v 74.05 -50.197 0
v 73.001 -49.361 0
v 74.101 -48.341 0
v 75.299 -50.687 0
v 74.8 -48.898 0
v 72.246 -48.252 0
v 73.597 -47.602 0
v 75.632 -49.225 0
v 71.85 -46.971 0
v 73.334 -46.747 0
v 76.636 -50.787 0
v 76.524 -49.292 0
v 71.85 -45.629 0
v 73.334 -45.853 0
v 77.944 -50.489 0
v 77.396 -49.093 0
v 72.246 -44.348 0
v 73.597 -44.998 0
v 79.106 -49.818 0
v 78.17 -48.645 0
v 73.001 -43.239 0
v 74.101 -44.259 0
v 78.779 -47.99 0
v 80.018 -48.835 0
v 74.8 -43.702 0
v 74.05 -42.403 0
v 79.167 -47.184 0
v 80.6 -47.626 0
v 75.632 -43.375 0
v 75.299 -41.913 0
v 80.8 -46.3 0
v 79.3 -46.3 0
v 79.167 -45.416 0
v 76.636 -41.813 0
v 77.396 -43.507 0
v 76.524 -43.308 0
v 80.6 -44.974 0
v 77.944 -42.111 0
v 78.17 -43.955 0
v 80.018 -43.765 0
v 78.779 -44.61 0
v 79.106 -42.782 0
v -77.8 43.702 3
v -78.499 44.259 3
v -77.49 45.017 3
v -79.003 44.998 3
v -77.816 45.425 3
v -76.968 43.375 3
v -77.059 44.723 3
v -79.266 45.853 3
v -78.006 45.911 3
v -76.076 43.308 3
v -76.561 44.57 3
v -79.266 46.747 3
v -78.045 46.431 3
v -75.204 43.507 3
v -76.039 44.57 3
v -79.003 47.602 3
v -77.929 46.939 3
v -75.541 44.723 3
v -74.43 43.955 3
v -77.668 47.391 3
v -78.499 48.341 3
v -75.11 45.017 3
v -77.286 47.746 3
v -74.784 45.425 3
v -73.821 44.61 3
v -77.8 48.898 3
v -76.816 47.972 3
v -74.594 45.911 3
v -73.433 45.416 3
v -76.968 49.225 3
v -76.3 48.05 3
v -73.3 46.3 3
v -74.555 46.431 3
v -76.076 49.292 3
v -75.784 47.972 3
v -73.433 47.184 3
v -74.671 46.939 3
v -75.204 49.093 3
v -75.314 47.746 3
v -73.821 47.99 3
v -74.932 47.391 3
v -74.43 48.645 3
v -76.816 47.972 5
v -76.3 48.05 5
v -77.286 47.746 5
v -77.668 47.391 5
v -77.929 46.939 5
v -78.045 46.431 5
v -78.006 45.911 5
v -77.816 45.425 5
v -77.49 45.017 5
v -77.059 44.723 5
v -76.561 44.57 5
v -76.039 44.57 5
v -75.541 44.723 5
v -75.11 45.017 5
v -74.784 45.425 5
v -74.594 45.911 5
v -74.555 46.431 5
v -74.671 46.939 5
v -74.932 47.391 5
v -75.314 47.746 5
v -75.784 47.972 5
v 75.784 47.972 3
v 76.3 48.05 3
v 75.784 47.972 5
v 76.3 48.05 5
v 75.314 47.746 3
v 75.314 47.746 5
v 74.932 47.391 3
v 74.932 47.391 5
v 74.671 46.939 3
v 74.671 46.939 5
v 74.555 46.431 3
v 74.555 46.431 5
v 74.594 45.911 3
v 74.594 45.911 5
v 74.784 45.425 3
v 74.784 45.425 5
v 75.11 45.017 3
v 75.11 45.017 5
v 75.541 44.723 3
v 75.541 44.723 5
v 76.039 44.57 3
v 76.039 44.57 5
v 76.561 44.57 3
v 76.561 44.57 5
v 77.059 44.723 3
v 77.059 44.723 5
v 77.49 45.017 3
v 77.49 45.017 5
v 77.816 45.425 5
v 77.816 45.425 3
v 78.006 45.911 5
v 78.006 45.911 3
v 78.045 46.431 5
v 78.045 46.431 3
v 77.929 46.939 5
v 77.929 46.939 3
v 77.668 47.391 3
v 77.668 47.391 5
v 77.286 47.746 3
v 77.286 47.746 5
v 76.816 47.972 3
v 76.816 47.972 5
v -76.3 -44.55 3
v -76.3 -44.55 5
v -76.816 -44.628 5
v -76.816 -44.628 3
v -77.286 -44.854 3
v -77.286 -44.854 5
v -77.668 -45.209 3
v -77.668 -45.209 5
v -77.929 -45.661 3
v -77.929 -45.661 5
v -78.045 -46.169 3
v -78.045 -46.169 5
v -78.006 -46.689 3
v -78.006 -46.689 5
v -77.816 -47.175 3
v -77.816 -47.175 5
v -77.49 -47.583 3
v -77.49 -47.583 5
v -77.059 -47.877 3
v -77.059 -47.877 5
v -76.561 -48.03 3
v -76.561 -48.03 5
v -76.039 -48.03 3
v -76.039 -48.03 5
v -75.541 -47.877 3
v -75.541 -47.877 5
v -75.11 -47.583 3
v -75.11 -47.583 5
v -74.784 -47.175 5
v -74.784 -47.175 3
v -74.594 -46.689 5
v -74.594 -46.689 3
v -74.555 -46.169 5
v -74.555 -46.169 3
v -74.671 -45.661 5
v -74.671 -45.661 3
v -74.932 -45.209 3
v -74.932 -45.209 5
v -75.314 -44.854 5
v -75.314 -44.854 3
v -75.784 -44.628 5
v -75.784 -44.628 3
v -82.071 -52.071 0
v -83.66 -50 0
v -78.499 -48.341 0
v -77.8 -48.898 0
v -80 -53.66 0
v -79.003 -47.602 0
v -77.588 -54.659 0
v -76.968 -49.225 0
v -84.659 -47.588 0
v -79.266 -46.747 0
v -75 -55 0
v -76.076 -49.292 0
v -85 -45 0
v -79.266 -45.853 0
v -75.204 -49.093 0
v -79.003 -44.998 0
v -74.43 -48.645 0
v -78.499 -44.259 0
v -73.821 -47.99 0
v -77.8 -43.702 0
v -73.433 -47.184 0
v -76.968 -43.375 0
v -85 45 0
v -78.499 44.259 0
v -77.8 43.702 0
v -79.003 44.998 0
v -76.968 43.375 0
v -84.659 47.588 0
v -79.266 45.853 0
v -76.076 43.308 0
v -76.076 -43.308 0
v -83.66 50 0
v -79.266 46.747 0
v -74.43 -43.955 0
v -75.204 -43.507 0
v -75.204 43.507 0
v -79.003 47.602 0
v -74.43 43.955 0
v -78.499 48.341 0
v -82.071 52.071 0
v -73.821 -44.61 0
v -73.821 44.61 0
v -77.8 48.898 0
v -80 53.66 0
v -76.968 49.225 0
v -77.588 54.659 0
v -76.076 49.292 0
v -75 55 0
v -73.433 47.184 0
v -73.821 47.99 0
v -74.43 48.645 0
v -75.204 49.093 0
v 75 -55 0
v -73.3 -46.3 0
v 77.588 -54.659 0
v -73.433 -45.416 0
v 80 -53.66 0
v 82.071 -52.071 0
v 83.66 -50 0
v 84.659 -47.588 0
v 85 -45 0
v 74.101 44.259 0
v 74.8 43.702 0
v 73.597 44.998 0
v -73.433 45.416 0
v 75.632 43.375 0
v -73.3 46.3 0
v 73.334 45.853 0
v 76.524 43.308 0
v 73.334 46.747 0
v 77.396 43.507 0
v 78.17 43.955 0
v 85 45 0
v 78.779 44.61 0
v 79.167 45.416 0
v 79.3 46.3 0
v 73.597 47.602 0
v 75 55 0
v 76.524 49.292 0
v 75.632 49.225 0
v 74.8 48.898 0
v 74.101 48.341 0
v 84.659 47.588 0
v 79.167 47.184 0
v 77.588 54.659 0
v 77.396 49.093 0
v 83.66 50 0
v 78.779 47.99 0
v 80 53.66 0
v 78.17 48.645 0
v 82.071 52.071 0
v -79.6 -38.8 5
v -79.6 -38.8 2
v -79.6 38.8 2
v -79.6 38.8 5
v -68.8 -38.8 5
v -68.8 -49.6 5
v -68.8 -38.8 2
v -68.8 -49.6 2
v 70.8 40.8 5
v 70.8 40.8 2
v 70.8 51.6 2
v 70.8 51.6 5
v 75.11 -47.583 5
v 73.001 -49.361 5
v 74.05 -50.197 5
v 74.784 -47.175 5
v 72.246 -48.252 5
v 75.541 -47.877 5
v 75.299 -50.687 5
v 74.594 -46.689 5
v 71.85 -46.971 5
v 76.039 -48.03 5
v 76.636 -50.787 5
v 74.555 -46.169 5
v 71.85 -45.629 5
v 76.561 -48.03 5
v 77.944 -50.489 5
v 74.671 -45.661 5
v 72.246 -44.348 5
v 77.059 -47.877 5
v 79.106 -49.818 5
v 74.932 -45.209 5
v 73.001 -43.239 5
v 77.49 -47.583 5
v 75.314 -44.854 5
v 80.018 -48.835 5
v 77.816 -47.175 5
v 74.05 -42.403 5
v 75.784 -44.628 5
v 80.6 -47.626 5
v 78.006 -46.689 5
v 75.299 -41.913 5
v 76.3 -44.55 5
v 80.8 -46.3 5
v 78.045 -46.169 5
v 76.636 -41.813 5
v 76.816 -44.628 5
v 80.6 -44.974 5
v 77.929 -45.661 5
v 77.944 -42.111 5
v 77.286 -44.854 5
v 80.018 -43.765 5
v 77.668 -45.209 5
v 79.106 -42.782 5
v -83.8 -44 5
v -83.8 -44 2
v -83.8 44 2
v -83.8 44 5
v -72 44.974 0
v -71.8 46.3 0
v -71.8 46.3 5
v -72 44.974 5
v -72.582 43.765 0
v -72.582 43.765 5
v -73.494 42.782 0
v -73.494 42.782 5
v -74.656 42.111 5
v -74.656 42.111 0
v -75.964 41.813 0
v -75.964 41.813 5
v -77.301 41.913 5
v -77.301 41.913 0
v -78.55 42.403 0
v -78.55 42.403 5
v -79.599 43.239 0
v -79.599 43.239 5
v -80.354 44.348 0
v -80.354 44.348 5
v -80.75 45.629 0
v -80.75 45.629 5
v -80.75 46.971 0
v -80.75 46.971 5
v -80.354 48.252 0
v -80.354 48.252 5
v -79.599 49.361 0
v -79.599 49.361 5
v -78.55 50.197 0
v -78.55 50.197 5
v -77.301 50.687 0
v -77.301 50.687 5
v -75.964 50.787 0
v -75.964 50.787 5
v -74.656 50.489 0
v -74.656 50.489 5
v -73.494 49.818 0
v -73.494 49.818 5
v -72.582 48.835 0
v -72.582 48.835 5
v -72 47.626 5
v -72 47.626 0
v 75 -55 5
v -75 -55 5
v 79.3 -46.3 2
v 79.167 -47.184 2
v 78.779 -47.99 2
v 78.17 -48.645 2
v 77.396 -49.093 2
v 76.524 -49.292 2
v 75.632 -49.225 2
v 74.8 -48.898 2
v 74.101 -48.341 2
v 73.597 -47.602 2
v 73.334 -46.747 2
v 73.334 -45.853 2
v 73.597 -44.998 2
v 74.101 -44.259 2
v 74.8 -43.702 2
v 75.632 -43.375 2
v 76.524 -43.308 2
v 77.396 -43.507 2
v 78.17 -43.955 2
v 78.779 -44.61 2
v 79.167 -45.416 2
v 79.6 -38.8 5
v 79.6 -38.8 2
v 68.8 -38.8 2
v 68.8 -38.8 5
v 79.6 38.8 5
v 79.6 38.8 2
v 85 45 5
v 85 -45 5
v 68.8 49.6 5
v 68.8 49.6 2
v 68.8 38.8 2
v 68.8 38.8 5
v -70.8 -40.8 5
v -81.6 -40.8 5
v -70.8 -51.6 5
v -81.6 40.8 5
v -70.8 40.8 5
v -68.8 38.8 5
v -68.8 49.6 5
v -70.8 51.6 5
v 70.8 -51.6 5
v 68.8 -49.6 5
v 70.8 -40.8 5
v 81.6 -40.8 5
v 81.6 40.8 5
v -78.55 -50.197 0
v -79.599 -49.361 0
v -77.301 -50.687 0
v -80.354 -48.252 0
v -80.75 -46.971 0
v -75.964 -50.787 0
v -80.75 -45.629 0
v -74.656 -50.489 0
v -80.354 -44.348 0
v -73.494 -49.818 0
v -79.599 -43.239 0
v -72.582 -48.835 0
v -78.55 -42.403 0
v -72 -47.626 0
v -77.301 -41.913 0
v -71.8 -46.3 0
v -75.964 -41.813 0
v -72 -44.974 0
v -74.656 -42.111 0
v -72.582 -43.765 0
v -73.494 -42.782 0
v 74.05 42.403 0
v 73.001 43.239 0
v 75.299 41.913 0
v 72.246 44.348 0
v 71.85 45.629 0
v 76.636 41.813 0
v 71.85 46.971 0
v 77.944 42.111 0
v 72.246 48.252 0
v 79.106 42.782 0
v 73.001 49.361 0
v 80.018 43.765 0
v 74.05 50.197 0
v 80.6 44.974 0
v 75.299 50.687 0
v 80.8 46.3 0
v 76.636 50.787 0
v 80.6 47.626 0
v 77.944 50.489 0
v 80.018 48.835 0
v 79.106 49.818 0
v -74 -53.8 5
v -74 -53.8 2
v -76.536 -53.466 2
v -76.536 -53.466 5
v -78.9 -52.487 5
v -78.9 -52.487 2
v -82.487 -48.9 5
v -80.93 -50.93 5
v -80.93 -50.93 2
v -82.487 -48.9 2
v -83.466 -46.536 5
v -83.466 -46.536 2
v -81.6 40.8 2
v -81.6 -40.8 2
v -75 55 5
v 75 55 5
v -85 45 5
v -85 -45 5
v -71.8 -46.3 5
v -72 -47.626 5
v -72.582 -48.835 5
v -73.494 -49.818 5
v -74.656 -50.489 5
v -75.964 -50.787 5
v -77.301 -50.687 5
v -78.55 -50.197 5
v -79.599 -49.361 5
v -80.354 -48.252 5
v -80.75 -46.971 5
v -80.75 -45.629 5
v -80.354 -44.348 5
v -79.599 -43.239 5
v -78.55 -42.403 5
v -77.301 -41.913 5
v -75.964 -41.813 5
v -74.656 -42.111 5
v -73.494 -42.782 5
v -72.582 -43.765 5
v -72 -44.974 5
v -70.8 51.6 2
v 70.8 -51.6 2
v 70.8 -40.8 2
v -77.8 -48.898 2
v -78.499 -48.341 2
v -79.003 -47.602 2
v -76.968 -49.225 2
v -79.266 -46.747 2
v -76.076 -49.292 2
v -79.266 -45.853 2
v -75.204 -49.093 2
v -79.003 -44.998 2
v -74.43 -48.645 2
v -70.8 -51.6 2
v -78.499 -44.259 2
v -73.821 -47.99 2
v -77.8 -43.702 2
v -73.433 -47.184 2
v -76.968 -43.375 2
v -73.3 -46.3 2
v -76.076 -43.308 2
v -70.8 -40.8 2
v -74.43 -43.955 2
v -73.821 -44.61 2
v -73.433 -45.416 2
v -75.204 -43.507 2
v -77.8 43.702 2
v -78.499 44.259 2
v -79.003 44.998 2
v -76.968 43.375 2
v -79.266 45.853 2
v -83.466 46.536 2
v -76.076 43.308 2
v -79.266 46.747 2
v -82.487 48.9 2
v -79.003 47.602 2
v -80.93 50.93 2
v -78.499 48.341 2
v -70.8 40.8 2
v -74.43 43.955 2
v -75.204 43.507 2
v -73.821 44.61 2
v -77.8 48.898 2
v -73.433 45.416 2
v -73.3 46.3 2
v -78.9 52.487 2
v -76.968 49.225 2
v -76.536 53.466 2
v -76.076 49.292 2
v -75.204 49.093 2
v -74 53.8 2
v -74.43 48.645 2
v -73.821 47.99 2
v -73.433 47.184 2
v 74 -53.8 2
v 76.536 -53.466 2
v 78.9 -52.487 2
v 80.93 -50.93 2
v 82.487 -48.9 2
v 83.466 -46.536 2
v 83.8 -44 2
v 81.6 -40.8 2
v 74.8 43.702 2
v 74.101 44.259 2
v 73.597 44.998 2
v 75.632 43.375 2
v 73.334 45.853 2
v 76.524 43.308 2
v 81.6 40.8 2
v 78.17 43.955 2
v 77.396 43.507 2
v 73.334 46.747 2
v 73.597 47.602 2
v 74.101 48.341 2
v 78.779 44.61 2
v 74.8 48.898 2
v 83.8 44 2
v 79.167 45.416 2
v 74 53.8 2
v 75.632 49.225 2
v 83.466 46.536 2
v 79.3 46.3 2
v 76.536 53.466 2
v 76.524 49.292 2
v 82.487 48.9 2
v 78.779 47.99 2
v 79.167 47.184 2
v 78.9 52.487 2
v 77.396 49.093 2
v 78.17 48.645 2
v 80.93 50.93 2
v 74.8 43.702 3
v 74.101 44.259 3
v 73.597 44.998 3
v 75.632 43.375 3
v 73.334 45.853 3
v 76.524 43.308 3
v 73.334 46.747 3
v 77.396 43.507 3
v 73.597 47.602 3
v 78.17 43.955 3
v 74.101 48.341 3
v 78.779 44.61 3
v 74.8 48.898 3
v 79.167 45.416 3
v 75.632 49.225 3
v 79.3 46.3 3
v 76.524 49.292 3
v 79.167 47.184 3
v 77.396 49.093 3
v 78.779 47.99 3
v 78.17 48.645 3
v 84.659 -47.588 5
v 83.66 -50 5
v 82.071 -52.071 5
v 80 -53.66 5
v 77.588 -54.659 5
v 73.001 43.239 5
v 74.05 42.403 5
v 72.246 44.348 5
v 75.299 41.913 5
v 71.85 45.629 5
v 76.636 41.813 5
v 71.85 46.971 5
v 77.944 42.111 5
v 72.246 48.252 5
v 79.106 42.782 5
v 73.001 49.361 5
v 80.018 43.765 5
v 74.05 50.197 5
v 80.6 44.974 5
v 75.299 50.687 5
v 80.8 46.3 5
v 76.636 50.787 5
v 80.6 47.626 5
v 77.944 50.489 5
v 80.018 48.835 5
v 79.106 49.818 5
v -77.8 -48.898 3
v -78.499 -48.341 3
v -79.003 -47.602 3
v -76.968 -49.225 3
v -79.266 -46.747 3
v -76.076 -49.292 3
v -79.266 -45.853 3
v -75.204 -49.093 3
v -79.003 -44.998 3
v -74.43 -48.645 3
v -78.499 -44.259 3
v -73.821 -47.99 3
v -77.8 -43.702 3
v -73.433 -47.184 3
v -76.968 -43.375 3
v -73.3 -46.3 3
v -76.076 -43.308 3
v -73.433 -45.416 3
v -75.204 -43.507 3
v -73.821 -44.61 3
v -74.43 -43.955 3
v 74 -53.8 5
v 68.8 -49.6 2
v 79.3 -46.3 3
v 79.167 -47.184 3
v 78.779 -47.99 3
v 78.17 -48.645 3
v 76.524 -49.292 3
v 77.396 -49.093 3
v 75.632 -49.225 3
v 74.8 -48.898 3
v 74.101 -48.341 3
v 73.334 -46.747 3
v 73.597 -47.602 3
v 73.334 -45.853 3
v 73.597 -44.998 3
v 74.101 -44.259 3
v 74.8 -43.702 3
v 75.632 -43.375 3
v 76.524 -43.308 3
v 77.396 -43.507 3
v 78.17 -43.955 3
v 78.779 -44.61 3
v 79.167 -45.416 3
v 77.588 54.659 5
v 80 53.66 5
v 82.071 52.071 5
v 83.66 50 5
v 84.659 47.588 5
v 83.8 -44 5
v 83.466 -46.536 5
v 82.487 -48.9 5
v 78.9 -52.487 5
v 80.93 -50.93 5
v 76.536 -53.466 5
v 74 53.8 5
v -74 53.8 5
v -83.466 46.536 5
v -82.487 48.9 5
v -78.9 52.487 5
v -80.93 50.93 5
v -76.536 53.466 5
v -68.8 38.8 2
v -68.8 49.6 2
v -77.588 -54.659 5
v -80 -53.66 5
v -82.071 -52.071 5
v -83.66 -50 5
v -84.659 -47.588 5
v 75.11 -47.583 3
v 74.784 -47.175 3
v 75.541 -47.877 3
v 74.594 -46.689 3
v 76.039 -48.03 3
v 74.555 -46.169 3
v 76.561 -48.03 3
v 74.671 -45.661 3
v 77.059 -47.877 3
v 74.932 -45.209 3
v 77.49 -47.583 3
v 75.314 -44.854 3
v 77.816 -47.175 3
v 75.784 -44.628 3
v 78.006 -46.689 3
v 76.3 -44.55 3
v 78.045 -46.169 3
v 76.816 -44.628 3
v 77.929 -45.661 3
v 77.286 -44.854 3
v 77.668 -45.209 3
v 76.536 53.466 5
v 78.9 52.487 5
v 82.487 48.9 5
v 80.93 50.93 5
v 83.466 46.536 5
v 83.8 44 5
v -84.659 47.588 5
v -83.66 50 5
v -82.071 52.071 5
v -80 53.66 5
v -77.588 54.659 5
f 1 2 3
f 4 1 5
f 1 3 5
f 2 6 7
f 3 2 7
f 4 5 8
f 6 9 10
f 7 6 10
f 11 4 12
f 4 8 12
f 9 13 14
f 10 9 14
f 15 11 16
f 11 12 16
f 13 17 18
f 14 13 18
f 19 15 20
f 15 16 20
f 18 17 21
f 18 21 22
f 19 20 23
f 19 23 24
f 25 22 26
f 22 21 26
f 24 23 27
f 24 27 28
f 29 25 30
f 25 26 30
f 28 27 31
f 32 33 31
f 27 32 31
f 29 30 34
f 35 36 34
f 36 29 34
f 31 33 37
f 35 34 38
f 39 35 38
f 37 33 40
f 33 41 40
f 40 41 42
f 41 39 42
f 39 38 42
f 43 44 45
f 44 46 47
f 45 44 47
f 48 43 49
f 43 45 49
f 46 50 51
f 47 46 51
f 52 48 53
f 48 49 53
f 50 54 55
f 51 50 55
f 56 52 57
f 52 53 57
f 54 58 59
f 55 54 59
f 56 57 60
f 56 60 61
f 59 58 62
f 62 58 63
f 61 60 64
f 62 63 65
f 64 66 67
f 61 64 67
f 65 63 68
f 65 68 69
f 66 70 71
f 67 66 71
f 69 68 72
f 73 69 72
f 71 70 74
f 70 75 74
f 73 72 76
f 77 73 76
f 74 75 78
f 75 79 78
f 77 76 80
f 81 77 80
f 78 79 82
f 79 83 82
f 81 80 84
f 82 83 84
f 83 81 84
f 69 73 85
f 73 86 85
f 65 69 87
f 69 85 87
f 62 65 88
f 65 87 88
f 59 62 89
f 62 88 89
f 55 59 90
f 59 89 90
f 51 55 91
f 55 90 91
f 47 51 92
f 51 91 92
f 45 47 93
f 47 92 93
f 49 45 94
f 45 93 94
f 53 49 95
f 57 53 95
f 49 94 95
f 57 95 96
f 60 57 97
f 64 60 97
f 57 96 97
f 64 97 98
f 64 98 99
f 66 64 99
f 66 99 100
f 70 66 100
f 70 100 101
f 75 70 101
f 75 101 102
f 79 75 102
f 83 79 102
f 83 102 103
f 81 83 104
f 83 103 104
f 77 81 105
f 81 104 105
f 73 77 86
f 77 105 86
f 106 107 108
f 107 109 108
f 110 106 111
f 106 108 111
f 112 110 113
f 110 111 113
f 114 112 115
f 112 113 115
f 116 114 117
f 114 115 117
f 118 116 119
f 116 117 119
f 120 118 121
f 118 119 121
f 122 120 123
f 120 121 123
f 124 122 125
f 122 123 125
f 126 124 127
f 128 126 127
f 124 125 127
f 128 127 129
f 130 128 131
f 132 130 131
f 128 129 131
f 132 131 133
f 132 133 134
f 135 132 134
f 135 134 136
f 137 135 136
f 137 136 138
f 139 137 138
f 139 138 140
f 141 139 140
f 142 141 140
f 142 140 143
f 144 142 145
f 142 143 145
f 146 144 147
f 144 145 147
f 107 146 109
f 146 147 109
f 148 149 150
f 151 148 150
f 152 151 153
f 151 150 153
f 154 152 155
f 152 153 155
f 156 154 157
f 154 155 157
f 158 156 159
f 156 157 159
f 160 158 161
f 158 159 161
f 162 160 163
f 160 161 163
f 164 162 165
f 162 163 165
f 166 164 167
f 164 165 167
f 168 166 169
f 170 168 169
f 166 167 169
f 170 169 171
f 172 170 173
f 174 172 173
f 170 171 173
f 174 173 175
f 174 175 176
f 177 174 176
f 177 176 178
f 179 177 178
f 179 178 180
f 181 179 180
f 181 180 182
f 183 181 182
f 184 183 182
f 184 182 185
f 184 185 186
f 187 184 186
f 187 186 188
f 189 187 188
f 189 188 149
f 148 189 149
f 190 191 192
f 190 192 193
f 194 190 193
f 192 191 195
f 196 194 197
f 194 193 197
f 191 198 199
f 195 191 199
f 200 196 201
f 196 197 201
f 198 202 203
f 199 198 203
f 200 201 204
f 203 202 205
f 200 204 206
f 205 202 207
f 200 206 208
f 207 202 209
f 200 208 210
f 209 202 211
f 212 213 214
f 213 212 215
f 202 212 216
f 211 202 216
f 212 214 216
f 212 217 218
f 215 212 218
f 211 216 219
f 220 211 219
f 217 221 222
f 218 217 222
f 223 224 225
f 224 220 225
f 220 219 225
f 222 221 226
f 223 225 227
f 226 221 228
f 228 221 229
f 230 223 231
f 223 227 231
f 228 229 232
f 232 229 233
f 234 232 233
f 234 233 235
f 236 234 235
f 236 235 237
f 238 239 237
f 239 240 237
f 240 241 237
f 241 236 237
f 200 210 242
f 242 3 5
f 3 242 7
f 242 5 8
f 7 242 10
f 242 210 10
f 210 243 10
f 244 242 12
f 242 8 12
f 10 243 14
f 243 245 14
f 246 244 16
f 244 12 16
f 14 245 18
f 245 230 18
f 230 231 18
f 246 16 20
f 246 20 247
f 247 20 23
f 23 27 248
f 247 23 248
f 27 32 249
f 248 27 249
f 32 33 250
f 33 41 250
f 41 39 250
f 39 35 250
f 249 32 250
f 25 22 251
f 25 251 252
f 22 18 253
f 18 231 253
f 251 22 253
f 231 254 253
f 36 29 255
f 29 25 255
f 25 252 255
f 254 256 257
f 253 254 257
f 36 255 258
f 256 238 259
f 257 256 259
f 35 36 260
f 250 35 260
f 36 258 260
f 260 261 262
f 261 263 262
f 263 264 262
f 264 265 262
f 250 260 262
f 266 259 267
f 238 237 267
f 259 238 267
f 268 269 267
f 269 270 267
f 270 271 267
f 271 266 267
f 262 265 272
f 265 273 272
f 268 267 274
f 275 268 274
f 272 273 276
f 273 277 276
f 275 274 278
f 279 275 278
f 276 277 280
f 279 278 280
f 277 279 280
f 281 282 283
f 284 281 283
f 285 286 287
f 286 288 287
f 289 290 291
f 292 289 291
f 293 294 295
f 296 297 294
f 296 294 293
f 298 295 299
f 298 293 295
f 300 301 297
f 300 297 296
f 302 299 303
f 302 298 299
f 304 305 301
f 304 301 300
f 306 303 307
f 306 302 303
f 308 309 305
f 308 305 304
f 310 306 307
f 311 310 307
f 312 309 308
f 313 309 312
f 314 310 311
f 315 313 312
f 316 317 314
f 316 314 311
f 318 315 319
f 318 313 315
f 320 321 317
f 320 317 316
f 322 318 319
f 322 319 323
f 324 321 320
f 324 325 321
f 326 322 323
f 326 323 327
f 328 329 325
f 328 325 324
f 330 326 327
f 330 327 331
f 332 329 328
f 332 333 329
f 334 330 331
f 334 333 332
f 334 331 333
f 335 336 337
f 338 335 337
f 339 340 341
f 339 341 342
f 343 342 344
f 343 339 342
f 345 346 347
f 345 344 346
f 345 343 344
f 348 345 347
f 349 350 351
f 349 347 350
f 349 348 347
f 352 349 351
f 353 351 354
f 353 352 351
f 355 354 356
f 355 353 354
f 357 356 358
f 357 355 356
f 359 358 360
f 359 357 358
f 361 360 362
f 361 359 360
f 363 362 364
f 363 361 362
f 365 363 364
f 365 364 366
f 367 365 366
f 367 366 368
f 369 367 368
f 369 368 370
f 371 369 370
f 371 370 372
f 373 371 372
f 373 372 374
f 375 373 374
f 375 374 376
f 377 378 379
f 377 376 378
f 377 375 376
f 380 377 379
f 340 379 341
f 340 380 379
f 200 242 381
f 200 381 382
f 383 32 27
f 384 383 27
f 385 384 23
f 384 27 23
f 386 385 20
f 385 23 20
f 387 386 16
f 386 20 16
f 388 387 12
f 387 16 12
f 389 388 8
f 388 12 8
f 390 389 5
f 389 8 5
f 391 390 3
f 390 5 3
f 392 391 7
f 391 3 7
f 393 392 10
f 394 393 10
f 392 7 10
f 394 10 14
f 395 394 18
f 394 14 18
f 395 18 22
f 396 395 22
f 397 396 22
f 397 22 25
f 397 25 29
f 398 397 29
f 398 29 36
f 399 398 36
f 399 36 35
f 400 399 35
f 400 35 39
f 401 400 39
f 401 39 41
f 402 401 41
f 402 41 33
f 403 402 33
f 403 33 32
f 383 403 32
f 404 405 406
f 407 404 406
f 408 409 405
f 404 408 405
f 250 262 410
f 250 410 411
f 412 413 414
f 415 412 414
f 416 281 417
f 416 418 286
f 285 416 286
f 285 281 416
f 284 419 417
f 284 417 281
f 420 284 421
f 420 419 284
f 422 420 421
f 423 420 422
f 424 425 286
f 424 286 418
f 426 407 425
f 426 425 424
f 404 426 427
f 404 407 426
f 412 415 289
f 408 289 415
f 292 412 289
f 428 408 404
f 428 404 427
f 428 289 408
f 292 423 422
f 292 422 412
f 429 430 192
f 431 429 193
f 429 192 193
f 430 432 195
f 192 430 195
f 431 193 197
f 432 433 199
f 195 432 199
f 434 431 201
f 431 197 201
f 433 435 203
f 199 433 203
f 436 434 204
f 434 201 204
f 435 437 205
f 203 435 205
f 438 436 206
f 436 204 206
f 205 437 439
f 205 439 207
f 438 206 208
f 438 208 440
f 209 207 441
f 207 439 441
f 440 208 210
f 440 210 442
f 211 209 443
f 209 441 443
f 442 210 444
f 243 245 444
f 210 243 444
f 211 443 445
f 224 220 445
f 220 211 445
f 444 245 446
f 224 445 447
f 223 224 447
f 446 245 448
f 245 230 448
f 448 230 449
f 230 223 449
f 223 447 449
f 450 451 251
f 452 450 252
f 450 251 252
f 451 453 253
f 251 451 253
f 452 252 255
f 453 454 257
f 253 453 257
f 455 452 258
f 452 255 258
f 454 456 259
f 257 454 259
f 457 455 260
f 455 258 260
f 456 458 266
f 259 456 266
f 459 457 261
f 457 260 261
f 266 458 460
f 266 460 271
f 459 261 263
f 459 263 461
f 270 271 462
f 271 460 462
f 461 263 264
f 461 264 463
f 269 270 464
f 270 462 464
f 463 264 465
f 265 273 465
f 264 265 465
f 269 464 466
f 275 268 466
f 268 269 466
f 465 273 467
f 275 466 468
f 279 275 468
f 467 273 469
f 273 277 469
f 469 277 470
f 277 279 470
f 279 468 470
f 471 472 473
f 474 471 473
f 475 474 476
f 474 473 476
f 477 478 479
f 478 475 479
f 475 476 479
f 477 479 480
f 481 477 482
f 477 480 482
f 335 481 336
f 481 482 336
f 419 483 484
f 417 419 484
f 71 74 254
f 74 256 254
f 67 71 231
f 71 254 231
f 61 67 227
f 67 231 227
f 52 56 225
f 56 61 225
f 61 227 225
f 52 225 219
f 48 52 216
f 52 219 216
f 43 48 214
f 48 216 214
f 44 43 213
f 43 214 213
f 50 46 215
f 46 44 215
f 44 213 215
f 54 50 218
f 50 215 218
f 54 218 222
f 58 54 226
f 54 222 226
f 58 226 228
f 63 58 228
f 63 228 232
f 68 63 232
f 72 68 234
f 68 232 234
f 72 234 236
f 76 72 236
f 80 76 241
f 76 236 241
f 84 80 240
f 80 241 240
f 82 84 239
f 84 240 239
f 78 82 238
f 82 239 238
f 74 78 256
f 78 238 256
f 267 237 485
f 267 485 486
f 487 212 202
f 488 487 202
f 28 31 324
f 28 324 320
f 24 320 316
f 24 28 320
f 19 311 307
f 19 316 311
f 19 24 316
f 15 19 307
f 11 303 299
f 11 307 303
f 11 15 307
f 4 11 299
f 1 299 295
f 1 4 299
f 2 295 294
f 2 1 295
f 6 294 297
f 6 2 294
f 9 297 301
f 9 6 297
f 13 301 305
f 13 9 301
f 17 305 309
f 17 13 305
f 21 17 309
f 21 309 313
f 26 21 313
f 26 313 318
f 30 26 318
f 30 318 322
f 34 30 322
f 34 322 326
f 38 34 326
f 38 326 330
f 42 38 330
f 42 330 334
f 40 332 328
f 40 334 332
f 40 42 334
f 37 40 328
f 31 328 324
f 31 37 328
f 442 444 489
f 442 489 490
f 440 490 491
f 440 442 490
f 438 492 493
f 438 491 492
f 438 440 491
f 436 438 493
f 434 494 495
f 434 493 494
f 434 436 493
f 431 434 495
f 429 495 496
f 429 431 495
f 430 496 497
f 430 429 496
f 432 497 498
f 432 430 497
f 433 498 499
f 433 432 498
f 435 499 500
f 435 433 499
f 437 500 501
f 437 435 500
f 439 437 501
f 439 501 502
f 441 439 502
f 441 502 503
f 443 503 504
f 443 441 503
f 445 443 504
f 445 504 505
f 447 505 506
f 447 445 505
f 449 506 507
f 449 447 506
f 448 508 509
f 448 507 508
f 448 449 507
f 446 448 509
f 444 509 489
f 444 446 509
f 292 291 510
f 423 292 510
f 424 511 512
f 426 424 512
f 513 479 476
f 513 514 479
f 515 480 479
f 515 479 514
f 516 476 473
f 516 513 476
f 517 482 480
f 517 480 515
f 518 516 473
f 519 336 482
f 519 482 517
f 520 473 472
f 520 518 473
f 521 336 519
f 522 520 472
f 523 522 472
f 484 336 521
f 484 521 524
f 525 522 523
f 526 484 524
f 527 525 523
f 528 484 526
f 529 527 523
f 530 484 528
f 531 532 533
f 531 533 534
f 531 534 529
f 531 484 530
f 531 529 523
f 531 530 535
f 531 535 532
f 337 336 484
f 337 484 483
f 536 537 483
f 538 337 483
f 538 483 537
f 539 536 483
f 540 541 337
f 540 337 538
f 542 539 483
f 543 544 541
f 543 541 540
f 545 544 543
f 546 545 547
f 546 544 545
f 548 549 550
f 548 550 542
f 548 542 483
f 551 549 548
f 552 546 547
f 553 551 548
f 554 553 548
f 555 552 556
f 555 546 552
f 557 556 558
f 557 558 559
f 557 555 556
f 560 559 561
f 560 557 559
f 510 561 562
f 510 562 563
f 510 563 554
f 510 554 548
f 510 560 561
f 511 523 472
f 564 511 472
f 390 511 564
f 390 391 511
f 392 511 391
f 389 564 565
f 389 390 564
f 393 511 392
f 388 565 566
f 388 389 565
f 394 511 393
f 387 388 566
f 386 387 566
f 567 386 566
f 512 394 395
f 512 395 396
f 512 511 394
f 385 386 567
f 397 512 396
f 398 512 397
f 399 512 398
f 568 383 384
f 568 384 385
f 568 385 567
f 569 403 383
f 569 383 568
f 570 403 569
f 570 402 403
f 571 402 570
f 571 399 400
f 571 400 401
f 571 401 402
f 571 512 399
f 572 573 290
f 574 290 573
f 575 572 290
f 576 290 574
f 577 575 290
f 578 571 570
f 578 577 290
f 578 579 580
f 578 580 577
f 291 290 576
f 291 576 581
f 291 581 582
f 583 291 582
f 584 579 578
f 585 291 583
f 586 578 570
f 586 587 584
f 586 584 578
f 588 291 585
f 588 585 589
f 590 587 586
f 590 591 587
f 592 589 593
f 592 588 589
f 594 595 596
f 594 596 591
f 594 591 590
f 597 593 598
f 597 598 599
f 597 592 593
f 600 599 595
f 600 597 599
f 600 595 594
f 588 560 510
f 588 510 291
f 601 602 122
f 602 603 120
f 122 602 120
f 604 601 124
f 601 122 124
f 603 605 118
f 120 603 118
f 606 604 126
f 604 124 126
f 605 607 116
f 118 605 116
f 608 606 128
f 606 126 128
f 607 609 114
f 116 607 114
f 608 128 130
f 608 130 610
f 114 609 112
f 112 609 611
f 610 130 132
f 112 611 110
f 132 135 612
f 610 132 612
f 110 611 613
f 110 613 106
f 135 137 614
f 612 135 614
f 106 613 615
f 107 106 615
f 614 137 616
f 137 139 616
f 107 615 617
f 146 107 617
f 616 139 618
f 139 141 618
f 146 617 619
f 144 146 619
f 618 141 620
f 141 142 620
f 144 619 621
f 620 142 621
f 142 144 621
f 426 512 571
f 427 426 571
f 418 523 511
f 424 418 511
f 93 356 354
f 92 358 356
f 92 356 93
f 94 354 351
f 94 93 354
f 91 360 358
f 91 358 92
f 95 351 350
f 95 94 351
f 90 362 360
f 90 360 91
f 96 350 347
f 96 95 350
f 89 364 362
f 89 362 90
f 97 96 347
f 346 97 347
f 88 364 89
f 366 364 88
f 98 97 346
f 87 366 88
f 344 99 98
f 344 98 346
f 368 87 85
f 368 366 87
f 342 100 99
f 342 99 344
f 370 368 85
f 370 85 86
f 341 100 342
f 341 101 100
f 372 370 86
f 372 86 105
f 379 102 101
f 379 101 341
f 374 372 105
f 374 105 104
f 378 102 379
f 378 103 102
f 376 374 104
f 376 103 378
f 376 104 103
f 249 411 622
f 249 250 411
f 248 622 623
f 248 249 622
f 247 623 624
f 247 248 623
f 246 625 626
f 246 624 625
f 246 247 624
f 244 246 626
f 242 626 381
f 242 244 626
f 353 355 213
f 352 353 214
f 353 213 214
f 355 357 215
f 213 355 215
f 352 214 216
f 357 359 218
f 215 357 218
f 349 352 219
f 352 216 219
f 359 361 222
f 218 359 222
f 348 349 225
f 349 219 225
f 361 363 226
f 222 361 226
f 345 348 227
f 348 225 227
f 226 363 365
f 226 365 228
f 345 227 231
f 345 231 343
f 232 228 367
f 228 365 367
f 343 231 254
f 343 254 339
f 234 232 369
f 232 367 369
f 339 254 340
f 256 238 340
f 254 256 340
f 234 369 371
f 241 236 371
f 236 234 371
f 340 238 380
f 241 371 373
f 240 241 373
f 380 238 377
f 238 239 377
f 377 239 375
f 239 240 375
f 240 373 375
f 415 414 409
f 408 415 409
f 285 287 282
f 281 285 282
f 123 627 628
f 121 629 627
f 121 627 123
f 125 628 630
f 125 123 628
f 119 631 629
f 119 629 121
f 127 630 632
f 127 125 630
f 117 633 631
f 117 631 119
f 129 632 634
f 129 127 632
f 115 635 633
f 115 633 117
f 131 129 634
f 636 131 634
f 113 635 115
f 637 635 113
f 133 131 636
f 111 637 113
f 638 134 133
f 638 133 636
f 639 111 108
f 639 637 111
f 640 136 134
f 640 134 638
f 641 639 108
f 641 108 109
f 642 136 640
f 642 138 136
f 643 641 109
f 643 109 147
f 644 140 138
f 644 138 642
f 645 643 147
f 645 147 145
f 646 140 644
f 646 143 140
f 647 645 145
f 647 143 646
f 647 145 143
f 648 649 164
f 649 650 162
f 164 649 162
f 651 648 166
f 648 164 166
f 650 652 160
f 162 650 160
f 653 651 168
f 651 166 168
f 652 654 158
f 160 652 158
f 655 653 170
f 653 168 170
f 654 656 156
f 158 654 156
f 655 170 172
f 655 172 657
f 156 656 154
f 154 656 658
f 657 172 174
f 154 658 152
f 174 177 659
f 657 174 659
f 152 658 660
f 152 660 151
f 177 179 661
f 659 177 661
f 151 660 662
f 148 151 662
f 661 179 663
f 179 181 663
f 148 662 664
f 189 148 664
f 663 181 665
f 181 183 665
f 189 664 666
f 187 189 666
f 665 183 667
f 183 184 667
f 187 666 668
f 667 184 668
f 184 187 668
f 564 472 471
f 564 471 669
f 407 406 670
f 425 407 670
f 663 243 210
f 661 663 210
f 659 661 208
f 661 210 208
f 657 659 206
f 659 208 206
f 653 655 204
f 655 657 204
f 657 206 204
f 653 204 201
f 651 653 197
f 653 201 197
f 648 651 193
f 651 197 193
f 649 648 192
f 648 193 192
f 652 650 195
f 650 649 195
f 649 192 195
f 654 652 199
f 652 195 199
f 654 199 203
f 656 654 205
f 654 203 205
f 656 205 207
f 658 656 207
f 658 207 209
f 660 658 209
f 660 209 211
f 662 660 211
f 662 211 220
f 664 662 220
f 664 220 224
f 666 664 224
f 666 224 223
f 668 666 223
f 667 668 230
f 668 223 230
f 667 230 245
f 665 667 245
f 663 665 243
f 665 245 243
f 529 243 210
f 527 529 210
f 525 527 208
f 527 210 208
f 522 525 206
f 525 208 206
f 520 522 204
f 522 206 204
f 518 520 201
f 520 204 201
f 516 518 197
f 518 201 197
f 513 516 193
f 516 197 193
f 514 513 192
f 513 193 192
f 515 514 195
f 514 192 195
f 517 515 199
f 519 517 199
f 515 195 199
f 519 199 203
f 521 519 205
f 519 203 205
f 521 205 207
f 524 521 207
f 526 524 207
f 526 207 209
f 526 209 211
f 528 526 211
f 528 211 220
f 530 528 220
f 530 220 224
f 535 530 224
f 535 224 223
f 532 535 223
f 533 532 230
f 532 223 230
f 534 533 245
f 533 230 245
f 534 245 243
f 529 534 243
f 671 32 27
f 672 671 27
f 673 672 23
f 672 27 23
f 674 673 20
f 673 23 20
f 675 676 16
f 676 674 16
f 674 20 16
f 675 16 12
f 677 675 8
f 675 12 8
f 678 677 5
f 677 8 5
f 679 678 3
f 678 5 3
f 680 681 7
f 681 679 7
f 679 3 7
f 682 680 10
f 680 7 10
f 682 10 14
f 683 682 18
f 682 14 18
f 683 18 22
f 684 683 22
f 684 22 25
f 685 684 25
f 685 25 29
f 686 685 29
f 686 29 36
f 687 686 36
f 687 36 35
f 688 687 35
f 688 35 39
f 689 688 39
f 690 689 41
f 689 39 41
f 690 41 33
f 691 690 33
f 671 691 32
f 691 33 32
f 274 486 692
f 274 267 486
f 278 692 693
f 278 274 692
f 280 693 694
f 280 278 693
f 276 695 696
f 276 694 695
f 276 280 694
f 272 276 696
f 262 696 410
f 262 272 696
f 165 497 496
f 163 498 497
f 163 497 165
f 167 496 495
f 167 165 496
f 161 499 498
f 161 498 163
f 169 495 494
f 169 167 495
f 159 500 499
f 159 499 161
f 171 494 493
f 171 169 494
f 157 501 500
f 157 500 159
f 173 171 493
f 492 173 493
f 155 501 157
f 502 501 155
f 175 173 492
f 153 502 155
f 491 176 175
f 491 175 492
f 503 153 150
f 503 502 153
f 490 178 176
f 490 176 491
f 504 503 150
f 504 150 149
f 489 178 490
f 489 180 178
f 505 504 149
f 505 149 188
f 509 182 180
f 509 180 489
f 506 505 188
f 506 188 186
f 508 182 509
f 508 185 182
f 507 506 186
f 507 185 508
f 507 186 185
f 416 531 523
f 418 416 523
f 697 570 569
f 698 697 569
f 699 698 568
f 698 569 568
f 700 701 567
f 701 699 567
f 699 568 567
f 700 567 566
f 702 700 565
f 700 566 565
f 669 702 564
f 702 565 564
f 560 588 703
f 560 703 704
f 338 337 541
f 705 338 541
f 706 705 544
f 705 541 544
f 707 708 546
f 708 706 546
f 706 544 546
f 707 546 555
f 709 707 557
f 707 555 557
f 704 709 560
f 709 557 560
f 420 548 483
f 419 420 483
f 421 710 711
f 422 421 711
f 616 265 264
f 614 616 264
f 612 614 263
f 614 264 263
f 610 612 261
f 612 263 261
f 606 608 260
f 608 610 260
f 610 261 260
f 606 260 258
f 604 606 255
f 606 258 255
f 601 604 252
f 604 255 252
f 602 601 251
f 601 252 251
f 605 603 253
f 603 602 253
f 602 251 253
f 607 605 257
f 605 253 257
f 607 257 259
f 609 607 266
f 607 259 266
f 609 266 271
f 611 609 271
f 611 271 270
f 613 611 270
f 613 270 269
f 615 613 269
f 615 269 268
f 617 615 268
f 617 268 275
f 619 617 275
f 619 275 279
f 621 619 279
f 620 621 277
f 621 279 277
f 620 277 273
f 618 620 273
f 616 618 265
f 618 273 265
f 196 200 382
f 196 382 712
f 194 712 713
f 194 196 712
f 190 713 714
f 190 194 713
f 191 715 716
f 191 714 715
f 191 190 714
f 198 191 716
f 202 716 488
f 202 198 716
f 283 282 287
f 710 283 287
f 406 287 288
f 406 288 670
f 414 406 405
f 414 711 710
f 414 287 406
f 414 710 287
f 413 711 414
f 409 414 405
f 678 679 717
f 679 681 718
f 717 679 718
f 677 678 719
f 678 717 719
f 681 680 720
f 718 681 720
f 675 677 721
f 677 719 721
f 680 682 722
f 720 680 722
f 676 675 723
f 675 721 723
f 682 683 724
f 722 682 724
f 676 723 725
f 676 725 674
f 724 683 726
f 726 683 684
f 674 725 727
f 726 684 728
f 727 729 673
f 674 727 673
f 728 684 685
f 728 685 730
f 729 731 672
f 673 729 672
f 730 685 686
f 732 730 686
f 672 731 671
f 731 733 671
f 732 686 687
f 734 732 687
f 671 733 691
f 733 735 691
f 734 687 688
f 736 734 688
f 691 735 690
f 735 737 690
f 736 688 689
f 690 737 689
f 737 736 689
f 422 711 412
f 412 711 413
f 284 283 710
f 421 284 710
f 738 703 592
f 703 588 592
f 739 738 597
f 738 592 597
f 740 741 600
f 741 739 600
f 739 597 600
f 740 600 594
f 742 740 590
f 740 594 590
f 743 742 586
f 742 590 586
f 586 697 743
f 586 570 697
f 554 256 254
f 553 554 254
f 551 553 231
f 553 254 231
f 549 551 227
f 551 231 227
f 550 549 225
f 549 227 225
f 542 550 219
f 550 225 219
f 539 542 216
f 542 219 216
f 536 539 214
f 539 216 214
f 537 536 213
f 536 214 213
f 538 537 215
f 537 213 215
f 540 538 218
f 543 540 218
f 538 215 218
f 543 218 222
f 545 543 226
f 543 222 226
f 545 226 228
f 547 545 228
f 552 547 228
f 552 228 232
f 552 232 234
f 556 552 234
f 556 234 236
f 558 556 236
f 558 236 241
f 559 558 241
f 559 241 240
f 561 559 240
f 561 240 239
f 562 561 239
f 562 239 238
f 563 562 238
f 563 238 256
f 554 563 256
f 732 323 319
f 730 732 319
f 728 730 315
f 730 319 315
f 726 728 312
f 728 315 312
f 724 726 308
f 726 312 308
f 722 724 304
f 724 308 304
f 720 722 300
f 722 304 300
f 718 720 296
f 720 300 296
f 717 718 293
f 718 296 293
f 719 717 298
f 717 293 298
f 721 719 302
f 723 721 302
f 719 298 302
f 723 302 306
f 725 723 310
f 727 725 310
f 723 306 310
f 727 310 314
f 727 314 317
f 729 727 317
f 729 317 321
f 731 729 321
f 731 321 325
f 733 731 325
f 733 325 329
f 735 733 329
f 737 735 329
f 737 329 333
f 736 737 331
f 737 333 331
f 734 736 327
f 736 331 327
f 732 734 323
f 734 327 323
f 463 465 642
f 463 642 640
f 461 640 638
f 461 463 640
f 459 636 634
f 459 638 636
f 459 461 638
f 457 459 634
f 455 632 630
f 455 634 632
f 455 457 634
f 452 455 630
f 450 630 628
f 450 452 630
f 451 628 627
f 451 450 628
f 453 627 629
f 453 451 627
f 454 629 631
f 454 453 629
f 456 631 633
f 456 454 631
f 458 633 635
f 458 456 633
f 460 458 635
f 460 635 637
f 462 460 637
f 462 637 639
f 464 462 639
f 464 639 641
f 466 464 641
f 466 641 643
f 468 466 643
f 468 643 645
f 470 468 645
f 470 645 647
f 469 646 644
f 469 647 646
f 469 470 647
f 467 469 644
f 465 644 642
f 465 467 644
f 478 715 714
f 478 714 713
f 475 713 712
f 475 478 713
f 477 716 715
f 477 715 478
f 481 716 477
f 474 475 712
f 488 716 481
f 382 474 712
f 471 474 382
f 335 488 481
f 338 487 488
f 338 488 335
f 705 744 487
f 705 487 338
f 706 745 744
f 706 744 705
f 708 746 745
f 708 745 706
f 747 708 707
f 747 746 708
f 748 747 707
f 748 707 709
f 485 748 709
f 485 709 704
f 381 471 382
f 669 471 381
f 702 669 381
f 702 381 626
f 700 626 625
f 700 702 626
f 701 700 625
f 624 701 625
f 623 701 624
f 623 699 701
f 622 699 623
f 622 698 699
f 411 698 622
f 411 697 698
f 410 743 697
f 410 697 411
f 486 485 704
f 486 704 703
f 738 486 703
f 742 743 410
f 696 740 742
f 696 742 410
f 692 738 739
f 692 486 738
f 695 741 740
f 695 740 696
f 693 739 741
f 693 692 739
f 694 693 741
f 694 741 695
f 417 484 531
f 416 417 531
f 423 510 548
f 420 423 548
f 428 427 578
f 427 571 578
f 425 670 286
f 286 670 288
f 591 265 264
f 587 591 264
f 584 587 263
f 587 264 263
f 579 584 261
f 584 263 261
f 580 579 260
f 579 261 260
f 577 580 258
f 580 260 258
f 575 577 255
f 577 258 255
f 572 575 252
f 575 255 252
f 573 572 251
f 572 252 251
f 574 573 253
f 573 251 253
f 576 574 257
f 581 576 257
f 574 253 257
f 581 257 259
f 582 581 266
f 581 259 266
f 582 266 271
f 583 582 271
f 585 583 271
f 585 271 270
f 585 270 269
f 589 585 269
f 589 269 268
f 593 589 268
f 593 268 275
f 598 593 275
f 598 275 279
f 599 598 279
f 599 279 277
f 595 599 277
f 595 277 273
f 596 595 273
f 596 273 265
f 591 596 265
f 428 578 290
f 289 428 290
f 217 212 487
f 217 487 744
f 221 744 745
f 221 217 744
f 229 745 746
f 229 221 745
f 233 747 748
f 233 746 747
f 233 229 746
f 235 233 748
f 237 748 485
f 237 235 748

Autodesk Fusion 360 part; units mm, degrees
sketch "Skizze1" plane through (0, 0, 0) normal (0, 0, 1) x (1, 0, 0)
  line L0 (85, -55) -> (-85, -55) construction
  line L1 (-85, -55) -> (-85, 55) construction
  line L2 (-85, 55) -> (85, 55) construction
  line L3 (85, 55) -> (85, -55) construction
  line L4 (85, -55) -> (-85, 55) construction
  line L5 (-85, -55) -> (85, 55) construction
  line L6 (83.8, -53.8) -> (-83.8, -53.8) construction
  line L7 (-83.8, -53.8) -> (-83.8, 53.8) construction
  line L8 (-83.8, 53.8) -> (83.8, 53.8) construction
  line L9 (83.8, 53.8) -> (83.8, -53.8) construction
  line L10 (83.8, -53.8) -> (-83.8, 53.8) construction
  line L11 (-83.8, -53.8) -> (83.8, 53.8) construction
  line L12 (60, 45) -> (112.6344, 45) construction
  line L13 (75, 65.4743) -> (75, 20.9271) construction
  arc A0 (85, 45) -> (75, 55) centre (75, 45) ccw
  line L14 (74, 76.2401) -> (74, -7.7296) construction
  line L15 (56.5373, 44) -> (104.4576, 44) construction
  arc A1 (83.8, 44) -> (74, 53.8) centre (74, 44) ccw
  line L16 (69, 40.8) -> (92.7084, 40.8) construction
  line L17 (70.8, 58.1175) -> (70.8, 37.2449) construction
  line L18 (-99.6173, 51.6) -> (133.2089, 51.6) construction
  line L19 (-98.318, -51.6) -> (125.4134, -51.6) construction
  line L20 (-81.6, 68.7546) -> (-81.6, -65.5882) construction
  line L21 (81.6, 76.2401) -> (81.6, -68.4466) construction
  line L22 (0, 88.5072) -> (0, -73.8187) construction
  line L23 (-112.3323, 0) -> (170, 0) construction
  arc A2 (-75, 55) -> (-85, 45) centre (-75, 45) ccw
  arc A3 (-74, 53.8) -> (-83.8, 44) centre (-74, 44) ccw
  arc A4 (75, -55) -> (85, -45) centre (75, -45) ccw
  arc A5 (74, -53.8) -> (83.8, -44) centre (74, -44) ccw
  arc A6 (-83.8, -44) -> (-74, -53.8) centre (-74, -44) ccw
  arc A7 (-85, -45) -> (-75, -55) centre (-75, -45) ccw
  line L24 (-85, 45) -> (-85, -45)
  line L25 (-83.8, -44) -> (-83.8, 44)
  line L26 (-75, 55) -> (75, 55)
  line L27 (74, 53.8) -> (-74, 53.8)
  line L28 (85, 45) -> (85, -45)
  line L29 (83.8, -44) -> (83.8, 44)
  line L30 (75, -55) -> (-75, -55)
  line L31 (-74, -53.8) -> (74, -53.8)
  line L32 (70.8, -51.6) -> (70.8, -40.8)
  line L33 (70.8, -40.8) -> (81.6, -40.8)
  line L34 (81.6, -40.8) -> (81.6, 40.8)
  line L35 (81.6, 40.8) -> (70.8, 40.8)
  line L36 (70.8, 40.8) -> (70.8, 51.6)
  line L37 (70.8, 51.6) -> (-70.8, 51.6)
  line L38 (-70.8, 40.8) -> (-71, 40.8)
  line L39 (-70.8, 51.6) -> (-70.8, 40.8)
  line L40 (-71, 40.8) -> (-81.6, 40.8)
  line L41 (-81.6, 40.8) -> (-81.6, -40.8)
  line L42 (-81.6, -40.8) -> (-70.8, -40.8)
  line L43 (-70.8, -40.8) -> (-70.8, -51.6)
  line L44 (-70.8, -51.6) -> (70.8, -51.6)
  line L45 (-105.874, 46.3) -> (130.8939, 46.3) construction
  line L46 (-106.5857, -46.3) -> (122.1159, -46.3) construction
  line L47 (76.3, 62.7556) -> (76.3, -77.2174) construction
  line L48 (-76.3, 64.1791) -> (-76.3, -73.896) construction
  circle A8 centre (76.3, 46.3) radius 4.5
  circle A9 centre (76.3, 46.3) radius 3
  circle A10 centre (76.3, -46.3) radius 4.5
  circle A11 centre (76.3, -46.3) radius 3
  circle A12 centre (-76.3, -46.3) radius 4.5
  circle A13 centre (-76.3, -46.3) radius 3
  circle A14 centre (-76.3, 46.3) radius 4.5
  circle A15 centre (-76.3, 46.3) radius 3
  line L49 (-68.8, 49.6) -> (68.8, 49.6)
  line L50 (68.8, 49.6) -> (68.8, 38.8)
  line L51 (68.8, 38.8) -> (79.6, 38.8)
  line L52 (79.6, 38.8) -> (79.6, -38.8)
  line L53 (79.6, -38.8) -> (68.8, -38.8)
  line L54 (68.8, -38.8) -> (68.8, -49.6)
  line L55 (68.8, -49.6) -> (-68.8, -49.6)
  line L56 (-68.8, -49.6) -> (-68.8, -38.8)
  line L57 (-68.8, -38.8) -> (-79.6, -38.8)
  line L58 (-79.6, -38.8) -> (-79.6, 38.8)
  line L59 (-79.6, 38.8) -> (-68.8, 38.8)
  line L60 (-68.8, 38.8) -> (-68.8, 49.6)
  point P0 (75, 45)
  point P1 (75, 55)
  point P2 (85, 45)
  point P3 (74, 44)
  point P4 (74, 53.8)
  point P5 (83.8, 44)
  point P6 (70.8, 51.6)
  point P7 (70.8, 40.8)
  point P8 (81.6, 40.8)
  point P9 (-81.6, 40.8)
  point P10 (-70.8, 51.6)
  point P11 (-70.8, 40.8)
  point P12 (81.6, -40.8)
  point P13 (70.8, -40.8)
  point P14 (70.8, -51.6)
  point P15 (-81.6, -40.8)
  point P16 (-70.8, -40.8)
  point P17 (-70.8, -51.6)
  point P18 (76.3, 46.3)
  point P19 (76.3, -46.3)
  point P20 (-76.3, -46.3)
  point P21 (-76.3, 46.3)
  dimension "d1" = 170
  dimension "d2" = 110
  dimension "d3" = 167.6
  dimension "d4" = 107.6
  dimension "d6" = 10
  dimension "d7" = 10
  dimension "d8" = 74
  dimension "d9" = 44
  dimension "d13" = 14.2
  dimension "d14" = 14.2
  dimension "d15" = 2.2
  dimension "d16" = 2.2
  dimension "d17" = 2.2
  dimension "d18" = 2.2
  dimension "d19" = 46.3
  dimension "d20" = 46.3
  dimension "d21" = 76.3
  dimension "d22" = 76.3
  dimension "d23" = 9
  dimension "d24" = 6
  dimension "d25" = 9
  dimension "d26" = 6
  dimension "d27" = 9
  dimension "d28" = 6
  dimension "d29" = 9
  dimension "d30" = 6
  dimension "d31" = 2
  dimension "d32" = 2
  dimension "d33" = 2
  dimension "d34" = 2
  dimension "d35" = 2
  dimension "d36" = 2
  dimension "d37" = 2
  dimension "d38" = 2
  dimension "d39" = 2
  dimension "d40" = 2
  dimension "d41" = 2
  dimension "d42" = 2
extrude "Extrusion1" add sketch "Skizze1" along normal blind 2 contours A1 A3 A5 A6 L25 L27 L29 L31 | A8 | A9 | A10 | A11 | A12 | A13 | A14 | A15 | L49 L50 L51 L52 L53 L54 L55 L56 L57 L58 L59 L60 makes body 1 at (-22.9333, 12.9333, 0) makes body 2 at (-73.6328, 48.2148, 0)
extrude "Extrusion2" add sketch "Skizze1" along normal blind 5 separate body contours A8 | A9 | A10 | A11 | A12 | A13 | A14 | A15 makes body 3 at (-75.0812, -41.9682, 3.3333) makes body 4 at (77.5188, -41.9682, 3.3333) makes body 5 at (-75.0812, 50.6318, 3.3333) makes body 6 at (77.5188, 50.6318, 3.3333)
hole "Bohrung2" at (-76.3, 46.3, 0) at (-76.3, -46.3, 0) at (76.3, -46.3, 0) at (76.3, 46.3, 0) direction (0, 0, 1) diameter 3.5 depth 15 tip angle 180 bodies 2 3 4 5 6
extrude "Extrusion3" cut sketch "Skizze1" along normal blind 3 contours A9 | A11 | A13 | A15 bodies 2 3 4 5 6
extrude "Extrusion4" add sketch "Skizze1" along normal blind 5 contours A0 A2 A4 A7 L24 L26 L28 L30 | L32 L33 L34 L35 L36 L37 L38 L39 L40 L41 L42 L43 L44 bodies 1 2
